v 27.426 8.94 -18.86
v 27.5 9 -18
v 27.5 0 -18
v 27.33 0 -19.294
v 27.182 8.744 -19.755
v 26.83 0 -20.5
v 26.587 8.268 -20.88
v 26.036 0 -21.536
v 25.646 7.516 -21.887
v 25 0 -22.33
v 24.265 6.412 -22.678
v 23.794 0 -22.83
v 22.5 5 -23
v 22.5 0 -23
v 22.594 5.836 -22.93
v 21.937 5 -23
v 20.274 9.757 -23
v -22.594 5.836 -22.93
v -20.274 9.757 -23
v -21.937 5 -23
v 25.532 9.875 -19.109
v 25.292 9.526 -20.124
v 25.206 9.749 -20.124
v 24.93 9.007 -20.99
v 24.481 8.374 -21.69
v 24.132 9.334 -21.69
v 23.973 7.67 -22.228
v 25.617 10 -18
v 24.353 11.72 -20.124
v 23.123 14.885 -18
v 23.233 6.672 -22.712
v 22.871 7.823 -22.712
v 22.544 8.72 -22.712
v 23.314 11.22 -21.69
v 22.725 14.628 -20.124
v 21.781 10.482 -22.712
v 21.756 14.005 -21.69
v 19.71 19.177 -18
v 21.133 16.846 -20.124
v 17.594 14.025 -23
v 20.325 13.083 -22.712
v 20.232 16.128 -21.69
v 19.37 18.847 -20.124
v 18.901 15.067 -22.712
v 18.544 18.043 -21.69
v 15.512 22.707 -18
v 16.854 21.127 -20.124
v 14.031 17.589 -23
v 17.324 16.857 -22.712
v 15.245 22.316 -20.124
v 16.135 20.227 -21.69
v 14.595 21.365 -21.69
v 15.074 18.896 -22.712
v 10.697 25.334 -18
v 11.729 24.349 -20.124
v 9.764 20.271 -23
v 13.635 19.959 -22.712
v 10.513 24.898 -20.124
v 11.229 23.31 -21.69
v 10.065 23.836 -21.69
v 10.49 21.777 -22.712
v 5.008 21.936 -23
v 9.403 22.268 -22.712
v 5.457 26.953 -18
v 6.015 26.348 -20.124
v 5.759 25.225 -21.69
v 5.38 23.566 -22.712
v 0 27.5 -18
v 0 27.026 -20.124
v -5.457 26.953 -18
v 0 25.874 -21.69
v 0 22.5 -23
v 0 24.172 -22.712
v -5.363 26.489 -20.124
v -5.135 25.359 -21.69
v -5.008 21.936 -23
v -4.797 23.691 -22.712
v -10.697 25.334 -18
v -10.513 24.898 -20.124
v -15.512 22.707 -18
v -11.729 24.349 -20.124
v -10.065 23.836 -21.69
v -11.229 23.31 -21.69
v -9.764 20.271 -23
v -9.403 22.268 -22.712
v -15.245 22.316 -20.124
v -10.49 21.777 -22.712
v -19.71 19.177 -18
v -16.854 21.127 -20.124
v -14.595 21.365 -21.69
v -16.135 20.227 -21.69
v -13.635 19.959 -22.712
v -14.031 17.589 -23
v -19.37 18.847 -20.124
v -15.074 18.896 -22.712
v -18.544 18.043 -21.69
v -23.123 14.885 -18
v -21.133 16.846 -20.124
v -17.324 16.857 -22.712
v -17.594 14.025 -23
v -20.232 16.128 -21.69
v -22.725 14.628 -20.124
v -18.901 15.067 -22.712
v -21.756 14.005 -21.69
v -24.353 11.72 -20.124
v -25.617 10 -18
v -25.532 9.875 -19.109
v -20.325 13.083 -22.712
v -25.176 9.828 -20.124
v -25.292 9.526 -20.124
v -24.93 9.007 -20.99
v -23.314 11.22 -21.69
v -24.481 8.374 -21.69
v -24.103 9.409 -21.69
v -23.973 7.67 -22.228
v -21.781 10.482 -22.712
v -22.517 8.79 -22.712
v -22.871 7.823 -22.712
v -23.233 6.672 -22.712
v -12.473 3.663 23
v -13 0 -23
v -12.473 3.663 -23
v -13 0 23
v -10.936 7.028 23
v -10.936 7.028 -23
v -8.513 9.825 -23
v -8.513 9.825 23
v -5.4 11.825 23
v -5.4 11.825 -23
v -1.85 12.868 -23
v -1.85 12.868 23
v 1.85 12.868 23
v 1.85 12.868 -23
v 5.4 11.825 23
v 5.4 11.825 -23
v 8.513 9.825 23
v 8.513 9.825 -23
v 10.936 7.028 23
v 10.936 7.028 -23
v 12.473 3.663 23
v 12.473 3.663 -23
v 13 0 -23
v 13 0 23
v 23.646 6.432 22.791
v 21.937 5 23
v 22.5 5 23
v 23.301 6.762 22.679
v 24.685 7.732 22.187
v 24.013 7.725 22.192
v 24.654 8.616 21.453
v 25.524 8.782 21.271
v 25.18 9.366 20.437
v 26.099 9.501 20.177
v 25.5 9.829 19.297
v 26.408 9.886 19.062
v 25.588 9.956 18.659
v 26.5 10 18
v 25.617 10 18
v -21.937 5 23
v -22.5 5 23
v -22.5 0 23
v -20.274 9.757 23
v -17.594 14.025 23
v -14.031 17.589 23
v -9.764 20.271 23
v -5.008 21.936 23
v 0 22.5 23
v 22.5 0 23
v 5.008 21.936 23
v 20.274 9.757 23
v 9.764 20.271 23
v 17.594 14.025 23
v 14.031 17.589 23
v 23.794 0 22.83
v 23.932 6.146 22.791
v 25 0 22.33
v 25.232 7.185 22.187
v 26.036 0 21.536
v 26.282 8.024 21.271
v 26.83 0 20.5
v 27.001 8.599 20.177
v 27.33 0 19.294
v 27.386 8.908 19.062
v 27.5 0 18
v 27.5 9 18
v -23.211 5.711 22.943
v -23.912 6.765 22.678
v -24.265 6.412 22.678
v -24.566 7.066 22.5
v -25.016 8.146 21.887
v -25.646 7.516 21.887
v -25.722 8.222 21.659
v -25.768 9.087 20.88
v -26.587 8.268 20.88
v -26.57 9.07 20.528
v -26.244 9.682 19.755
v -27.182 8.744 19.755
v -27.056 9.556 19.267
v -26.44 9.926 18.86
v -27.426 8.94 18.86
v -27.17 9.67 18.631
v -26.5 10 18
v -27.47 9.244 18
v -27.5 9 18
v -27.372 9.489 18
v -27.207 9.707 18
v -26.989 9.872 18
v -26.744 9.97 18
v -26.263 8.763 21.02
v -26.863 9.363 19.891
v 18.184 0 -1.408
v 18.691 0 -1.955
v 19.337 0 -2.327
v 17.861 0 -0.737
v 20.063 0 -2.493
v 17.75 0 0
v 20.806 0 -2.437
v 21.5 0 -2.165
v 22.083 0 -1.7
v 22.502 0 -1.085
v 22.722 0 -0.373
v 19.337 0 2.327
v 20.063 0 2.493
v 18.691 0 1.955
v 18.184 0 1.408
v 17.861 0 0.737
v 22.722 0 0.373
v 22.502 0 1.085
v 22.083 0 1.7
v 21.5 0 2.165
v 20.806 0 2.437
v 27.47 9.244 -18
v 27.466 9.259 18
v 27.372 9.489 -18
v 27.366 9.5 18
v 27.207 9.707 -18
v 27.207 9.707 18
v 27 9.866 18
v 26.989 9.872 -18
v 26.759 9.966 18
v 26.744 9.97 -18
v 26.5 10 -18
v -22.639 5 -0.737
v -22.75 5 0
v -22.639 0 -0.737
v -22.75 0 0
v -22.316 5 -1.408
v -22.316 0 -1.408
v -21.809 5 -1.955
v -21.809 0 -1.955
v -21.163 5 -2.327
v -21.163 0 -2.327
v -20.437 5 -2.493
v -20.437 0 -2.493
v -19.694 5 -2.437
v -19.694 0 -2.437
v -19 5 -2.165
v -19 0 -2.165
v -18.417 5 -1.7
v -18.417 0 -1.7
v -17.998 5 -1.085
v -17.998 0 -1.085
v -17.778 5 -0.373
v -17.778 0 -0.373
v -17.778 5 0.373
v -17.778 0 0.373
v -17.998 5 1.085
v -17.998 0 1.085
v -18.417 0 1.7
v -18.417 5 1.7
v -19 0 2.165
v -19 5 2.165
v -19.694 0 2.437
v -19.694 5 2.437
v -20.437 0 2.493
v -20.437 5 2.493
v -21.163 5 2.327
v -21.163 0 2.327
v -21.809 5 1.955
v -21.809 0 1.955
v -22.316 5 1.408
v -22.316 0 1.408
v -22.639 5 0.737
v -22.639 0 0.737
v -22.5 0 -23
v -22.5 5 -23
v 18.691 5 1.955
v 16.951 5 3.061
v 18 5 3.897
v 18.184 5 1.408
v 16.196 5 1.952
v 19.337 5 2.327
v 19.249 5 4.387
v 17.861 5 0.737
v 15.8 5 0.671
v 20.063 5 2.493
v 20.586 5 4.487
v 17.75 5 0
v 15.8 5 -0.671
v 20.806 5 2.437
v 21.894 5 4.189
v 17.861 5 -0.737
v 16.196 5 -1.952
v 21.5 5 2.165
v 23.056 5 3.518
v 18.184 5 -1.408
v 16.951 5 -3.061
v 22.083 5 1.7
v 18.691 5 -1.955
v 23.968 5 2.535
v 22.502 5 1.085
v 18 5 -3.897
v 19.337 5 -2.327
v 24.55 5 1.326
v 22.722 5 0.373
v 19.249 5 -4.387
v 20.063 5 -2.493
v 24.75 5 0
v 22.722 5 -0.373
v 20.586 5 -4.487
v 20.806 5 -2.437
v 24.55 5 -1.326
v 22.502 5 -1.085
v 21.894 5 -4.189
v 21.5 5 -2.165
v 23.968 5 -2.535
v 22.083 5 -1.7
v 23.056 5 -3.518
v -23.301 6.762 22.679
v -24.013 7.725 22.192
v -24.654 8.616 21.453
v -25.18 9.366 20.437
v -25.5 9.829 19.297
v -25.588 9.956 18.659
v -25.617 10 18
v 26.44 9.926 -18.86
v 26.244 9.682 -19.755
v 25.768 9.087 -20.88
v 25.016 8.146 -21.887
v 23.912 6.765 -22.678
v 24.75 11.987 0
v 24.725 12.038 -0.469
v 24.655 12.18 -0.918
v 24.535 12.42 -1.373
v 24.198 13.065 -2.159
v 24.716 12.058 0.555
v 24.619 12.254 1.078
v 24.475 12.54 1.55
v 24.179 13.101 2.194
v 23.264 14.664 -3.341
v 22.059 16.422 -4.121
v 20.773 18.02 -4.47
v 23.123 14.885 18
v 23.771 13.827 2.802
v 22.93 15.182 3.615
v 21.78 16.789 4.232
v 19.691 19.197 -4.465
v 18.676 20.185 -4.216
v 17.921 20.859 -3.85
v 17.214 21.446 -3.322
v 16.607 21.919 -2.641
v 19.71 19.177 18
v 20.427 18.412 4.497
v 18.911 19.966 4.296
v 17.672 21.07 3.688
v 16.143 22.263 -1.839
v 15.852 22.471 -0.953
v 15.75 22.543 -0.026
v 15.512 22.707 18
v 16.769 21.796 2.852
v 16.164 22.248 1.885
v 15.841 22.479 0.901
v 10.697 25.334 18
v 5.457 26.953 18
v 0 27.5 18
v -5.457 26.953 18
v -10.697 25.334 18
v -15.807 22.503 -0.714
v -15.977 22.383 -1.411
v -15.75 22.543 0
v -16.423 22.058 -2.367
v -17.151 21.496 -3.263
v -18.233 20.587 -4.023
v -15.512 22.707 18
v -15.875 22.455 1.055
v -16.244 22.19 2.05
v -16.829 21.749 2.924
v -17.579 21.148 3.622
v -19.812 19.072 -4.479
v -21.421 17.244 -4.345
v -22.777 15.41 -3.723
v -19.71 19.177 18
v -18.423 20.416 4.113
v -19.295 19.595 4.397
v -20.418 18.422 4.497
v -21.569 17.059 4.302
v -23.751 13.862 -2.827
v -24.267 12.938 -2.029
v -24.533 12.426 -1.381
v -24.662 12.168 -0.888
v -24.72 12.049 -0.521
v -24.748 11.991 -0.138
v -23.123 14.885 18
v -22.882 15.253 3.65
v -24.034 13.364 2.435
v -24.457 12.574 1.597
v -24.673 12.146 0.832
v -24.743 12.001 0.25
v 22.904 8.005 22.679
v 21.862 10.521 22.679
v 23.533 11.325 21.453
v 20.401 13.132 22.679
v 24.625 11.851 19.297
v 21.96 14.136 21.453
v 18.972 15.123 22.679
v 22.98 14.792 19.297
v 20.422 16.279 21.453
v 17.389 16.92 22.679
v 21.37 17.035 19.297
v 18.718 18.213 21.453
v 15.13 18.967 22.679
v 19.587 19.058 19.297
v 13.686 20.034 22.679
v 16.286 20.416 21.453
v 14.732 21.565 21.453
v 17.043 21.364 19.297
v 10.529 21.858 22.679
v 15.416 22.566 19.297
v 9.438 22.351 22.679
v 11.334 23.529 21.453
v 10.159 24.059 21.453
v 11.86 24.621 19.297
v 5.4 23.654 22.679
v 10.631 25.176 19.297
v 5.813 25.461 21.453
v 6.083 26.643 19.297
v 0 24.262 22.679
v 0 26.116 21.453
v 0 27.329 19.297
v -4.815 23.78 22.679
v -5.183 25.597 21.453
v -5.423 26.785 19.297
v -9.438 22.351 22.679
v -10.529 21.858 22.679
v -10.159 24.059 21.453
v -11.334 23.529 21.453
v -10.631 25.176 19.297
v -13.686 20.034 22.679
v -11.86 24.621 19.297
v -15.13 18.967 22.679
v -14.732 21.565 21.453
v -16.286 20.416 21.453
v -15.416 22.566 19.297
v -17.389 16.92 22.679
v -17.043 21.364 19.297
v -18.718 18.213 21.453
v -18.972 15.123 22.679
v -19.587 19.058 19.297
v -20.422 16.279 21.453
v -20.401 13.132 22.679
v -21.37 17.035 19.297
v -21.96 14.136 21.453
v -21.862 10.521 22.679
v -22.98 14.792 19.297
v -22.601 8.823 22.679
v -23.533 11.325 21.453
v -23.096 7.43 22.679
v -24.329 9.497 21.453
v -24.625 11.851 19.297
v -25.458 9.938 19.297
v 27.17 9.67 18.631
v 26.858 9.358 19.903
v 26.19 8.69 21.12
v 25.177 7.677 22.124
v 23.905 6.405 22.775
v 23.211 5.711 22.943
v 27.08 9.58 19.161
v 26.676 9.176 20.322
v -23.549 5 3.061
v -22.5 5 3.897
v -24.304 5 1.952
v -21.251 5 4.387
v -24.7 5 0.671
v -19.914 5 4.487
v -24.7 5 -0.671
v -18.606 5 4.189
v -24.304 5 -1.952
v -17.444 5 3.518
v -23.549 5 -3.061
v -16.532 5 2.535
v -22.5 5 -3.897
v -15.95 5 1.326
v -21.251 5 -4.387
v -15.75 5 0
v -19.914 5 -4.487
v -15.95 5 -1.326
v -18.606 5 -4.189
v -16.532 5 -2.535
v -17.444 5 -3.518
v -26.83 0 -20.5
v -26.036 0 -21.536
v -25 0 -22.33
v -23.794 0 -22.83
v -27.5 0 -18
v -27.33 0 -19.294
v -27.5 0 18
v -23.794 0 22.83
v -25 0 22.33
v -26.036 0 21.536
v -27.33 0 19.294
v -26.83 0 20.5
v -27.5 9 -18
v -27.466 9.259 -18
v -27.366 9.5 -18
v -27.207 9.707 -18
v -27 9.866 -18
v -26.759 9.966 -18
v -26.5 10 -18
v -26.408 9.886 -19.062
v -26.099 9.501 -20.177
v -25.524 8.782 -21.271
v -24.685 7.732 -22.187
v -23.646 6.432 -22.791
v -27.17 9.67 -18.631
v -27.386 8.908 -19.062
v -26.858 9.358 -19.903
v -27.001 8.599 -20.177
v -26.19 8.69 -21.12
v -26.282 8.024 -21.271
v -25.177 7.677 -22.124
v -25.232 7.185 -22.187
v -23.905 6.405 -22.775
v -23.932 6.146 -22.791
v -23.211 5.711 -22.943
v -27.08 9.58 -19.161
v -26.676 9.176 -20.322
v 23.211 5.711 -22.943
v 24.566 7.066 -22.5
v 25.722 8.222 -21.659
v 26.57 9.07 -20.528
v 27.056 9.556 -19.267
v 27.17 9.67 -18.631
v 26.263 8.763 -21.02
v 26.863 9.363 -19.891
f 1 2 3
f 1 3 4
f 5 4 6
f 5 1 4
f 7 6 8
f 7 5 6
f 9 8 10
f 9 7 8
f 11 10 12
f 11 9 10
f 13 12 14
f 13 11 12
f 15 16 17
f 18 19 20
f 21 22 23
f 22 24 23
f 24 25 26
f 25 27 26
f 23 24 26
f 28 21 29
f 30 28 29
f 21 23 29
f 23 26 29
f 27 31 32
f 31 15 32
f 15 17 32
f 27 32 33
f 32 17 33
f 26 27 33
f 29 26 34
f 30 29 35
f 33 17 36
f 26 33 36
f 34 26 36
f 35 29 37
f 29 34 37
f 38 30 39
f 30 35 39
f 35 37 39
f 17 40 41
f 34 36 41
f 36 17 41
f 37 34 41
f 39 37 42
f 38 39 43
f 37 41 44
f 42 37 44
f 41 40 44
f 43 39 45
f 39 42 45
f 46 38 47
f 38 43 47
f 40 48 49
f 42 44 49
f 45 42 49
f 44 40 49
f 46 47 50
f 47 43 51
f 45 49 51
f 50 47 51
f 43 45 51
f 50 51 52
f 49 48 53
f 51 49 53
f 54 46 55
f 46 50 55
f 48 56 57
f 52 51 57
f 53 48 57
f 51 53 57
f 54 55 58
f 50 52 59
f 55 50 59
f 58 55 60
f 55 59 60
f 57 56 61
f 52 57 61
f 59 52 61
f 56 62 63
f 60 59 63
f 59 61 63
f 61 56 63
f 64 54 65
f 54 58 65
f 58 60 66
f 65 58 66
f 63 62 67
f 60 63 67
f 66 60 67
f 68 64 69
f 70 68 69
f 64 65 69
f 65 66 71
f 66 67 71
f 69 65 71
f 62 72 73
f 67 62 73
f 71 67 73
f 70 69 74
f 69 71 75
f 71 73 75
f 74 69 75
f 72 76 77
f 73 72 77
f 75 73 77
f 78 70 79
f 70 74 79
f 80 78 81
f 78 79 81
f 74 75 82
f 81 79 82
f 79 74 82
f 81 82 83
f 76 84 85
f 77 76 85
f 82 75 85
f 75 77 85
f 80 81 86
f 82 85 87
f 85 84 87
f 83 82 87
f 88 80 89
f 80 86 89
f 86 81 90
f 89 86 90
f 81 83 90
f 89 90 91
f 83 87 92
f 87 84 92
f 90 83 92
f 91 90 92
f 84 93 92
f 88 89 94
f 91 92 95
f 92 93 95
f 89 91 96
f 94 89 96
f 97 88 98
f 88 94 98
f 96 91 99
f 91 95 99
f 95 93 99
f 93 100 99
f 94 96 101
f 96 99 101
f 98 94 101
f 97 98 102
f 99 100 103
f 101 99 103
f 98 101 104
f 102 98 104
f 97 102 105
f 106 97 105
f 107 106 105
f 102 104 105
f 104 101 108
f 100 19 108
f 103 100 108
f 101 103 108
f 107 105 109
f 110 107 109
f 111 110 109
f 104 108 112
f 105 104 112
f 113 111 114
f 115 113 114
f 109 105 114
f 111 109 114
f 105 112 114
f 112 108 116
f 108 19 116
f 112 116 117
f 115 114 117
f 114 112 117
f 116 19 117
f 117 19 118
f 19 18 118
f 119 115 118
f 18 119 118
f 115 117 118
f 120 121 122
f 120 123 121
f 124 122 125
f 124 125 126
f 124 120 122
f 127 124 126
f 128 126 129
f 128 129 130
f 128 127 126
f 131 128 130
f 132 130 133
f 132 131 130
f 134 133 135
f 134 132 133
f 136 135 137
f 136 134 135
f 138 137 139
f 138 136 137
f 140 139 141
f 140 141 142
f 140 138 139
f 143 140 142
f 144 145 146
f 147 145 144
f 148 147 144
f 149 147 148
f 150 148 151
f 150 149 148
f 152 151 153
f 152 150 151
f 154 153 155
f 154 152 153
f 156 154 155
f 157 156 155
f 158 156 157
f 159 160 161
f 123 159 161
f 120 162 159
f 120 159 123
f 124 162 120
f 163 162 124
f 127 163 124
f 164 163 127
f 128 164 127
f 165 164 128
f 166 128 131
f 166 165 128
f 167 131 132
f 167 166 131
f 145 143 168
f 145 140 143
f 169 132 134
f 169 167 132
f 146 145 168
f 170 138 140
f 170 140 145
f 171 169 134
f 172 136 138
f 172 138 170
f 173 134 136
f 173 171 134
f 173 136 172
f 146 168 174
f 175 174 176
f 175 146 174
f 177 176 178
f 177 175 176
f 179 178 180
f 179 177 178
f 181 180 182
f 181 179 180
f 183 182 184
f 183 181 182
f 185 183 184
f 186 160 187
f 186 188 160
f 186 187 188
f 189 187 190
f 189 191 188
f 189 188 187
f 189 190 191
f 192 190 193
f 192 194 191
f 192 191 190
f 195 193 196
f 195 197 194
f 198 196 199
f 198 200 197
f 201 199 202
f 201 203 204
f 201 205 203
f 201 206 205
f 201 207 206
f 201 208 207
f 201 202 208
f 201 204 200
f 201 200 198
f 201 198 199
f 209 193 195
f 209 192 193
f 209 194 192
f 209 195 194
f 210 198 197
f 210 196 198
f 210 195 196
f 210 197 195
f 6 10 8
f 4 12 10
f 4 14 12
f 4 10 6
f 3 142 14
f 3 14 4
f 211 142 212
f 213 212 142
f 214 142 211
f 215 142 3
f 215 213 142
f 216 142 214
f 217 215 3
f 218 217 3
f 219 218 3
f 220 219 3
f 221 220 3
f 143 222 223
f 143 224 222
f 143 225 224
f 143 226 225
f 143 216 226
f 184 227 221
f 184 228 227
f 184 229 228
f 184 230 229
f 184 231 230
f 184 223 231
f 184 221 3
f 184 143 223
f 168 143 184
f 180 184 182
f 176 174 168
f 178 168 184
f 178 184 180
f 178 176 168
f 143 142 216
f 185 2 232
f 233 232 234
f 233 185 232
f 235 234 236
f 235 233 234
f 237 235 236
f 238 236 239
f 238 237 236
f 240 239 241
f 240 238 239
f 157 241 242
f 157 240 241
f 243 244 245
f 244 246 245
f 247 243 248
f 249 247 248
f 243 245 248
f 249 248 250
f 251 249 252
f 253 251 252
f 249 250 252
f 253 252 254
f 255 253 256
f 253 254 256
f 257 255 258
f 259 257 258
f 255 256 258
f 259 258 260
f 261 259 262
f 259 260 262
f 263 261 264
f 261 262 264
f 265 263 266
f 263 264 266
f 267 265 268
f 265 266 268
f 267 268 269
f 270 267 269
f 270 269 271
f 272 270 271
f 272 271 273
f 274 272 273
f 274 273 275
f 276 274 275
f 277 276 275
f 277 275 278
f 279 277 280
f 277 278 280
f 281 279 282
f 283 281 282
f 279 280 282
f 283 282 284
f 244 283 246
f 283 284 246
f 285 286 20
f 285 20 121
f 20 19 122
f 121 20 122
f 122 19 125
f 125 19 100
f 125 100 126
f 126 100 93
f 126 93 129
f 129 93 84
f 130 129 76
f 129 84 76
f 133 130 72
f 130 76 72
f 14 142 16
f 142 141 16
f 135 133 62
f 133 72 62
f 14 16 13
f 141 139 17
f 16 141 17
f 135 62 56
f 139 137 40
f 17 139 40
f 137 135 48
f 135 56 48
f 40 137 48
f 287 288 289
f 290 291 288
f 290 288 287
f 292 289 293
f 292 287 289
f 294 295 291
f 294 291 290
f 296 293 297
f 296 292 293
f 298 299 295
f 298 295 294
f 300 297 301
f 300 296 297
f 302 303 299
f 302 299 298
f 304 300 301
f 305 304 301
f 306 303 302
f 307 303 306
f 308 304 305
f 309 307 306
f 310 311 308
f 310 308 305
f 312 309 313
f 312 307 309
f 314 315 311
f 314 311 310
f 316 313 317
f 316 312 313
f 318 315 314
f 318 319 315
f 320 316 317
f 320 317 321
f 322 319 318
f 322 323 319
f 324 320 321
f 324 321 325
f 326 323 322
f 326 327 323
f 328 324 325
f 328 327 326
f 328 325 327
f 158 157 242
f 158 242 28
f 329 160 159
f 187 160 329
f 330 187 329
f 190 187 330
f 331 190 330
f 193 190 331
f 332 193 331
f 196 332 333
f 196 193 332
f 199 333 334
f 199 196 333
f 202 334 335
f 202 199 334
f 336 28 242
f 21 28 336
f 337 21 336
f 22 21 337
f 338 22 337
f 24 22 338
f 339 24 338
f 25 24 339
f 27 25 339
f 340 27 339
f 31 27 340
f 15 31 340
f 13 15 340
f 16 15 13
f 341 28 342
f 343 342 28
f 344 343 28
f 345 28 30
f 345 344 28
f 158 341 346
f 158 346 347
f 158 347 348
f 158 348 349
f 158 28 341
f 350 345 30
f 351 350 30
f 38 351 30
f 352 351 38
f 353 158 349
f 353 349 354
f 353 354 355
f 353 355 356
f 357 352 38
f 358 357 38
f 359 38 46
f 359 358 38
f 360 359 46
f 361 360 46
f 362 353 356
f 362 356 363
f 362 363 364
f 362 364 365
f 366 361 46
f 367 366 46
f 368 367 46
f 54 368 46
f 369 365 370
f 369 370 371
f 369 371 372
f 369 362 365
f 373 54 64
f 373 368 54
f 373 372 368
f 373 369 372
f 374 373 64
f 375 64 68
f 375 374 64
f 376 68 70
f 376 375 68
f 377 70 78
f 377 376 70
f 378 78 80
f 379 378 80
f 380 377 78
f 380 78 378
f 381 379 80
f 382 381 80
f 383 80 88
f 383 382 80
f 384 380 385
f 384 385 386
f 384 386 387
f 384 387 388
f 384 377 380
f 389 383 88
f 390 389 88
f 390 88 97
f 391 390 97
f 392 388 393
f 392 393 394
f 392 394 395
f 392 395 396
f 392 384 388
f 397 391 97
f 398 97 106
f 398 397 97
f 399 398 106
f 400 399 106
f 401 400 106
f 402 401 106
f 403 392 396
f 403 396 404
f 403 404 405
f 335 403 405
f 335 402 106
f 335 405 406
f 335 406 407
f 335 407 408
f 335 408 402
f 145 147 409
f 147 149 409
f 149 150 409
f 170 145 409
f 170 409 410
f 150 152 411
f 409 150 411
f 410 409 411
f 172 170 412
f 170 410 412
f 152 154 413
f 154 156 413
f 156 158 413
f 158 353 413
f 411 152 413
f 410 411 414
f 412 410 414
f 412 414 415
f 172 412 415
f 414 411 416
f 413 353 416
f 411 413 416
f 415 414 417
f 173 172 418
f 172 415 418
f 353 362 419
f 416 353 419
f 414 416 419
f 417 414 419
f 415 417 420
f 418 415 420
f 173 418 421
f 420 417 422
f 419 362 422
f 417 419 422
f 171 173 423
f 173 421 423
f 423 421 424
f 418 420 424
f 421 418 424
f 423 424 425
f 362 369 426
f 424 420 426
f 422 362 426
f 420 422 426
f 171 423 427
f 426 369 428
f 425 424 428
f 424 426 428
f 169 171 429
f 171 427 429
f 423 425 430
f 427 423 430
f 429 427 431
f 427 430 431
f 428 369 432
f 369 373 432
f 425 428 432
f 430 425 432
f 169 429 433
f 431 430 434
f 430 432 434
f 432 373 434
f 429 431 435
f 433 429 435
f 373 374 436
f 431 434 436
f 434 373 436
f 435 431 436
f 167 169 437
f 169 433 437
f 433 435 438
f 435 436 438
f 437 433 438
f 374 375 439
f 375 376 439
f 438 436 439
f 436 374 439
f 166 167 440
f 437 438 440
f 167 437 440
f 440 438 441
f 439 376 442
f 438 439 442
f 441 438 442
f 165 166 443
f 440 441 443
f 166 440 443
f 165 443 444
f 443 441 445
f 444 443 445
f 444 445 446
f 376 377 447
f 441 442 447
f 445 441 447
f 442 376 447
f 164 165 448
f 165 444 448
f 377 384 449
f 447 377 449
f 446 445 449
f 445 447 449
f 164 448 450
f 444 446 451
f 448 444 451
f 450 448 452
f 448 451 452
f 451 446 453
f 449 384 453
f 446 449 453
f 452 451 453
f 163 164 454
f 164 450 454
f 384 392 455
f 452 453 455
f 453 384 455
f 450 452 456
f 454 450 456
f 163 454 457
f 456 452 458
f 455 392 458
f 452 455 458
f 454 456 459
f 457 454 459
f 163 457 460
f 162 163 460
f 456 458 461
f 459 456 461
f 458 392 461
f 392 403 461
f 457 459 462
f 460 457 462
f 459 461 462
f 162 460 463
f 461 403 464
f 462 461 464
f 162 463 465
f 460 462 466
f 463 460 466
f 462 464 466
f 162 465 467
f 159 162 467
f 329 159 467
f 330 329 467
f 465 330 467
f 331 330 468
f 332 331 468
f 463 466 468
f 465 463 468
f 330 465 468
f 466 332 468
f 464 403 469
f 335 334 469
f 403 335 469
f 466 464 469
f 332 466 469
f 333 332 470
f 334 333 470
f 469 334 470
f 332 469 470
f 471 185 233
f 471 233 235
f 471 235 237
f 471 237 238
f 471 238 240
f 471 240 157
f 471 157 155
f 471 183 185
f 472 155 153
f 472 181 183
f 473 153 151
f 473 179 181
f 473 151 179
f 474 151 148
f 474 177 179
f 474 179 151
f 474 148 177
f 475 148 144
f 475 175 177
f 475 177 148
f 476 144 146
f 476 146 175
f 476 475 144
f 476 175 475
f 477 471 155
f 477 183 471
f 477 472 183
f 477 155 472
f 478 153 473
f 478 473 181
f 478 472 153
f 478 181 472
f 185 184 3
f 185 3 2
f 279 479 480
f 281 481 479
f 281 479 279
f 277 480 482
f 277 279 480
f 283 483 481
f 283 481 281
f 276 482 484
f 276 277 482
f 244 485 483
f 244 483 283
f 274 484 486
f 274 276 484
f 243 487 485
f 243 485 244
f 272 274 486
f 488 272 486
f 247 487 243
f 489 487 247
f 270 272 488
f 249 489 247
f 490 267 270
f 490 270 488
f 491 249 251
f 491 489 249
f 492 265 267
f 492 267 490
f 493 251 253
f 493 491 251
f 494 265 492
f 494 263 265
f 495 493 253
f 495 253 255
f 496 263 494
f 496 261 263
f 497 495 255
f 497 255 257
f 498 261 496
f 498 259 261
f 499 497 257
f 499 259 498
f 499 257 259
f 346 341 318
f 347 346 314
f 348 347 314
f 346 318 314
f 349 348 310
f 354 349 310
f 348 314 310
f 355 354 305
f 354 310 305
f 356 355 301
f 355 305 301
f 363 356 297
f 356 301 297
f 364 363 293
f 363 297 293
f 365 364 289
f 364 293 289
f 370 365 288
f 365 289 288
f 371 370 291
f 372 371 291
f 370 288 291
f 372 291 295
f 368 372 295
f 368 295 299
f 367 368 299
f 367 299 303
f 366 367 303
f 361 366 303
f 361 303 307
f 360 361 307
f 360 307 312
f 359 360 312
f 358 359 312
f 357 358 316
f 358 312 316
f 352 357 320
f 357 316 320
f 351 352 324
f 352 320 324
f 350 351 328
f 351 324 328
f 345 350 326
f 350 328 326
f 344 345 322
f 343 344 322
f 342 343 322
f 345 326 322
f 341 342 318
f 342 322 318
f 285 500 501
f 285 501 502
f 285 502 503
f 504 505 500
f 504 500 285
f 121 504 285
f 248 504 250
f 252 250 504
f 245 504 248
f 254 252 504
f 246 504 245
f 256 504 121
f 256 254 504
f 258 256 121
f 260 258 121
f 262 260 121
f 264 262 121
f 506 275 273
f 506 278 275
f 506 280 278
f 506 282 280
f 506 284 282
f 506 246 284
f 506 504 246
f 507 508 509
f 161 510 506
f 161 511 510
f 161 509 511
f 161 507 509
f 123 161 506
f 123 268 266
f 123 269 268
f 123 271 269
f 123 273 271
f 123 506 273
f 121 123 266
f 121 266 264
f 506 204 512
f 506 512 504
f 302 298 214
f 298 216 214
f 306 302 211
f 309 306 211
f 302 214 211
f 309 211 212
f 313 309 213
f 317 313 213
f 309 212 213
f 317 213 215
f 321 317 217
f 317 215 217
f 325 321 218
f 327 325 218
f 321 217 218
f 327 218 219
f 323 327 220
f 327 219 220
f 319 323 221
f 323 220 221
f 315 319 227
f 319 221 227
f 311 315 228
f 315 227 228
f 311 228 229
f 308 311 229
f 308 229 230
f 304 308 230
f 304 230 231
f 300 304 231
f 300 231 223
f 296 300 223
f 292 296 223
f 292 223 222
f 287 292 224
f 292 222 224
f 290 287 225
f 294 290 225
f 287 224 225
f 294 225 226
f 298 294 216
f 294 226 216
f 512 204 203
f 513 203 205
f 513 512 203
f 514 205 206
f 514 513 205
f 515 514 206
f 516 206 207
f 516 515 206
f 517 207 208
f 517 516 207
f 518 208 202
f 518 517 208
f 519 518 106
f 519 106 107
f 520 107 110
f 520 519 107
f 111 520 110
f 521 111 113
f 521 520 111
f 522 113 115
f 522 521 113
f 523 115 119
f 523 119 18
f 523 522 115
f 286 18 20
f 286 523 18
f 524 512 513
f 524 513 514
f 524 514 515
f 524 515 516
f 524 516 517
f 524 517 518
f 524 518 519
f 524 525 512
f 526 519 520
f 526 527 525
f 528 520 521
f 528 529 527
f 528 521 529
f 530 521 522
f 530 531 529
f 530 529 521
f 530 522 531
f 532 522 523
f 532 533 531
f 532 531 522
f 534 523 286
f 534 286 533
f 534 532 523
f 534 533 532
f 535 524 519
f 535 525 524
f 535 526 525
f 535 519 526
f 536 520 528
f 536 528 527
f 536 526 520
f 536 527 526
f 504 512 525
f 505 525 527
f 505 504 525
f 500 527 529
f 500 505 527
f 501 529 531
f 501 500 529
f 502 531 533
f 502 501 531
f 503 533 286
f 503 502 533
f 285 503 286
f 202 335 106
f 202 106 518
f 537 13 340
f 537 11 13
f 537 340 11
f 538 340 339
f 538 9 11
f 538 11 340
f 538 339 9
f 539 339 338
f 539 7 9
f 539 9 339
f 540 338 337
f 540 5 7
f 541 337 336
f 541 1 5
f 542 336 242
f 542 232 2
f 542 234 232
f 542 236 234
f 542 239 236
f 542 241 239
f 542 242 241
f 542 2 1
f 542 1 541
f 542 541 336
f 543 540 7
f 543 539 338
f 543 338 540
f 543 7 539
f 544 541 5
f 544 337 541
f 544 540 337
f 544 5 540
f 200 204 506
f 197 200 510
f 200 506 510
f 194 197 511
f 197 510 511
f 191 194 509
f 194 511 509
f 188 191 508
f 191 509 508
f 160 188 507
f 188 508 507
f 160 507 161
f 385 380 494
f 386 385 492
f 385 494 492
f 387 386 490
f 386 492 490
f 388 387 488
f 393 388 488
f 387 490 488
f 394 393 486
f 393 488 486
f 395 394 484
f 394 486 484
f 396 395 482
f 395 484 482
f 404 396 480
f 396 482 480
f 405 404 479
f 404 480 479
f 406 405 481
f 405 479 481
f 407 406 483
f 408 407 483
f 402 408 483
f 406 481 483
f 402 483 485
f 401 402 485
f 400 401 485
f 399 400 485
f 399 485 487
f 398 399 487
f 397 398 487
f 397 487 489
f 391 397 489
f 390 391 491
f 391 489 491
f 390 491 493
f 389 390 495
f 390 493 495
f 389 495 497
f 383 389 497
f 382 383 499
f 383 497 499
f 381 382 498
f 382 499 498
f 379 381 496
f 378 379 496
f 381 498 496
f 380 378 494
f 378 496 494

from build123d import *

# Parameters (mm, degrees)
F1_DEPTH       = 23
F4_D           = 9
F4_DEPTH       = 15
F4_TIP         = 2.7038727856
F5_D           = 5
F5_DEPTH       = 15
F5_CBORE_D     = 9
F5_CBORE_DEPTH = 5
F5_TIP         = 1.5021515476
F6_R           = 5
F7_R           = 5
F8_R           = 1
F9_R           = 1


with BuildPart() as f1:
    # F0 (on Top) → F1 (new body, symmetric)
    with BuildSketch(Plane.XY):
        with BuildLine():
            Line((-13, 10), (-13, 0))
            ThreePointArc((-13, 0), (0, 13), (13, 0))
            Line((13, 0), (13, 10))
            Line((13, 10), (25.6173769149, 10))
            ThreePointArc((25.6173769149, 10), (0, 27.5), (-25.6173769149, 10))
            Line((-25.6173769149, 10), (-13, 10))
        make_face()
        with BuildLine():
            Line((-27.5, 0), (-13, 0))
            Line((-13, 0), (-13, 10))
            Line((-13, 10), (-25.6173769149, 10))
            ThreePointArc((-25.6173769149, 10), (-27.0252462076, 5.0878352391), (-27.5, 0))
        make_face()
        with BuildLine():
            Line((13, 10), (13, 0))
            Line((13, 0), (27.5, 0))
            ThreePointArc((27.5, 0), (27.0252462076, 5.0878352391), (25.6173769149, 10))
            Line((25.6173769149, 10), (13, 10))
        make_face()
        with BuildLine():
            Line((-27.5, 10), (-27.5, 0))
            ThreePointArc((-27.5, 0), (-27.0252462076, 5.0878352391), (-25.6173769149, 10))
            Line((-25.6173769149, 10), (-27.5, 10))
        make_face()
        with BuildLine():
            ThreePointArc((25.6173769149, 10), (27.0252462076, 5.0878352391), (27.5, 0))
            Line((27.5, 0), (27.5, 10))
            Line((27.5, 10), (25.6173769149, 10))
        make_face()
    extrude(amount=F1_DEPTH, both=True)

    # F4 (one way)
    with BuildSketch(Plane.XZ.offset(-10)):
        with Locations((20.25, 0), (-20.25, 0)):
            Circle(F4_D / 2)
    extrude(amount=-F4_DEPTH, mode=Mode.SUBTRACT)
    with Locations(Plane.XZ.offset(-10)):
        with Locations((20.25, 0), (-20.25, 0)):
            with Locations((0, 0, -(F4_DEPTH + F4_TIP / 2))):  # 118° drill point
                Cone(0, F4_D / 2, F4_TIP, mode=Mode.SUBTRACT)

    # F5
    with Locations(Plane(origin=(0, 10, 0), x_dir=(1, 0, 0), z_dir=(0, 1, 0))):
        with Locations((-20.25, 0), (20.25, 0)):
            CounterBoreHole(F5_D / 2, F5_CBORE_D / 2, F5_CBORE_DEPTH, depth=F5_DEPTH)
            with Locations((0, 0, -(F5_DEPTH + F5_TIP / 2))):  # 118° drill point
                Cone(0, F5_D / 2, F5_TIP, mode=Mode.SUBTRACT)

    # F6
    f6_edges = [f1.edges().sort_by_distance(p)[0] for p in [
        (27.5, 5, -23),
        (-27.5, 5, -23),
        (-26.558688, 10, -23),
        (0, 27.5, -23),
        (26.558688, 10, -23),
    ]]
    fillet(f6_edges, radius=F6_R)

    # F7
    f7_edges = [f1.edges().sort_by_distance(p)[0] for p in [
        (0, 27.5, 23),
        (26.558688, 10, 23),
        (-26.558688, 10, 23),
        (-27.5, 5, 23),
        (27.5, 5, 23),
    ]]
    fillet(f7_edges, radius=F7_R)

    # F8
    f8_edges = [f1.edges().sort_by_distance(p)[0] for p in [
        (27.5, 10, 0),
    ]]
    fillet(f8_edges, radius=F8_R)

    # F9
    f9_edges = [f1.edges().sort_by_distance(p)[0] for p in [
        (-27.5, 10, 0),
    ]]
    fillet(f9_edges, radius=F9_R)


solid = f1.part
